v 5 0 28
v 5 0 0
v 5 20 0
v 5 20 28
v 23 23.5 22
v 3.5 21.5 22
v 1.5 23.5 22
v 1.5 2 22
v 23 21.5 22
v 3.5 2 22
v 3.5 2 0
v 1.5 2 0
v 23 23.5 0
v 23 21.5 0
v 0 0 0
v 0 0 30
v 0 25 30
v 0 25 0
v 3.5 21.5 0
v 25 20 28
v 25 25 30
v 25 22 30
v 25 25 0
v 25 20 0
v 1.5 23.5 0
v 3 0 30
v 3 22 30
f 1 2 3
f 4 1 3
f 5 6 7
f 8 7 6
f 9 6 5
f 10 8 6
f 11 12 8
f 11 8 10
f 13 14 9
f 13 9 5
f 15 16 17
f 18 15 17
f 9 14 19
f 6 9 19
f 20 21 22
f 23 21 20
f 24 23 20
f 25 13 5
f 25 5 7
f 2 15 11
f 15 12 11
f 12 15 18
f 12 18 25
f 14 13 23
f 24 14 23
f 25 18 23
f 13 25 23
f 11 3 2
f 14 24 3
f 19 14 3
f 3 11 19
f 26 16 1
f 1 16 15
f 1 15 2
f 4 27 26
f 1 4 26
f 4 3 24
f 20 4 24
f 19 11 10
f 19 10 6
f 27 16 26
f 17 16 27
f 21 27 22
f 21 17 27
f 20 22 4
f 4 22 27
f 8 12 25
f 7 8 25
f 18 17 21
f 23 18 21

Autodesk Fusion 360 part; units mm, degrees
sketch "Sketch1" plane through (0, 0, 0) normal (0, 0, 1) x (1, 0, 0)
  line L0 (0, 0) -> (0, 25)
  line L1 (0, 25) -> (25, 25)
  line L2 (25, 25) -> (25, 20)
  line L3 (0, 0) -> (5, 0)
  line L4 (5, 0) -> (5, 20)
  line L5 (5, 20) -> (25, 20)
  dimension "d5" = 25
  dimension "d6" = 25
  dimension "d7" = 5
  dimension "d8" = 5
extrude "Extrude1" add sketch "Sketch1" along normal blind 30
chamfer "Chamfer1" distance 2 angle 45 1 edges at (5, 10, 30)
chamfer "Chamfer2" distance 2 angle 45 1 edges at (14, 20, 30)
sketch "Sketch2" plane through (0, 0, 0) normal (0, 0, -1) x (1, 0, 0)
  line L0 (5, 0) -> (0, 0)
  line L1 (0, 0) -> (0, -25)
  line L2 (0, -25) -> (25, -25)
  line L3 (25, -25) -> (25, -20)
  line L4 (25, -20) -> (5, -20)
  line L5 (5, -20) -> (5, 0)
  line L6 (1.5, -2) -> (3.5, -2)
  line L7 (1.5, -21.5) -> (1.5, -23.5)
  line L8 (23, -21.5) -> (23, -23.5)
  line L9 (3.5, -2) -> (3.5, -21.5)
  line L10 (1.5, -2) -> (1.5, -21.5)
  line L11 (23, -21.5) -> (3.5, -21.5)
  line L12 (23, -23.5) -> (1.5, -23.5)
  dimension "d13" = 2
  dimension "d14" = 1.5
  dimension "d18" = 1.5
  dimension "d19" = 2
  dimension "d20" = 2
  dimension "d21" = 2
extrude "Extrude2" cut sketch "Sketch2" against normal blind 22 contours L6 L7 L8 L9 L10 L11 L12
